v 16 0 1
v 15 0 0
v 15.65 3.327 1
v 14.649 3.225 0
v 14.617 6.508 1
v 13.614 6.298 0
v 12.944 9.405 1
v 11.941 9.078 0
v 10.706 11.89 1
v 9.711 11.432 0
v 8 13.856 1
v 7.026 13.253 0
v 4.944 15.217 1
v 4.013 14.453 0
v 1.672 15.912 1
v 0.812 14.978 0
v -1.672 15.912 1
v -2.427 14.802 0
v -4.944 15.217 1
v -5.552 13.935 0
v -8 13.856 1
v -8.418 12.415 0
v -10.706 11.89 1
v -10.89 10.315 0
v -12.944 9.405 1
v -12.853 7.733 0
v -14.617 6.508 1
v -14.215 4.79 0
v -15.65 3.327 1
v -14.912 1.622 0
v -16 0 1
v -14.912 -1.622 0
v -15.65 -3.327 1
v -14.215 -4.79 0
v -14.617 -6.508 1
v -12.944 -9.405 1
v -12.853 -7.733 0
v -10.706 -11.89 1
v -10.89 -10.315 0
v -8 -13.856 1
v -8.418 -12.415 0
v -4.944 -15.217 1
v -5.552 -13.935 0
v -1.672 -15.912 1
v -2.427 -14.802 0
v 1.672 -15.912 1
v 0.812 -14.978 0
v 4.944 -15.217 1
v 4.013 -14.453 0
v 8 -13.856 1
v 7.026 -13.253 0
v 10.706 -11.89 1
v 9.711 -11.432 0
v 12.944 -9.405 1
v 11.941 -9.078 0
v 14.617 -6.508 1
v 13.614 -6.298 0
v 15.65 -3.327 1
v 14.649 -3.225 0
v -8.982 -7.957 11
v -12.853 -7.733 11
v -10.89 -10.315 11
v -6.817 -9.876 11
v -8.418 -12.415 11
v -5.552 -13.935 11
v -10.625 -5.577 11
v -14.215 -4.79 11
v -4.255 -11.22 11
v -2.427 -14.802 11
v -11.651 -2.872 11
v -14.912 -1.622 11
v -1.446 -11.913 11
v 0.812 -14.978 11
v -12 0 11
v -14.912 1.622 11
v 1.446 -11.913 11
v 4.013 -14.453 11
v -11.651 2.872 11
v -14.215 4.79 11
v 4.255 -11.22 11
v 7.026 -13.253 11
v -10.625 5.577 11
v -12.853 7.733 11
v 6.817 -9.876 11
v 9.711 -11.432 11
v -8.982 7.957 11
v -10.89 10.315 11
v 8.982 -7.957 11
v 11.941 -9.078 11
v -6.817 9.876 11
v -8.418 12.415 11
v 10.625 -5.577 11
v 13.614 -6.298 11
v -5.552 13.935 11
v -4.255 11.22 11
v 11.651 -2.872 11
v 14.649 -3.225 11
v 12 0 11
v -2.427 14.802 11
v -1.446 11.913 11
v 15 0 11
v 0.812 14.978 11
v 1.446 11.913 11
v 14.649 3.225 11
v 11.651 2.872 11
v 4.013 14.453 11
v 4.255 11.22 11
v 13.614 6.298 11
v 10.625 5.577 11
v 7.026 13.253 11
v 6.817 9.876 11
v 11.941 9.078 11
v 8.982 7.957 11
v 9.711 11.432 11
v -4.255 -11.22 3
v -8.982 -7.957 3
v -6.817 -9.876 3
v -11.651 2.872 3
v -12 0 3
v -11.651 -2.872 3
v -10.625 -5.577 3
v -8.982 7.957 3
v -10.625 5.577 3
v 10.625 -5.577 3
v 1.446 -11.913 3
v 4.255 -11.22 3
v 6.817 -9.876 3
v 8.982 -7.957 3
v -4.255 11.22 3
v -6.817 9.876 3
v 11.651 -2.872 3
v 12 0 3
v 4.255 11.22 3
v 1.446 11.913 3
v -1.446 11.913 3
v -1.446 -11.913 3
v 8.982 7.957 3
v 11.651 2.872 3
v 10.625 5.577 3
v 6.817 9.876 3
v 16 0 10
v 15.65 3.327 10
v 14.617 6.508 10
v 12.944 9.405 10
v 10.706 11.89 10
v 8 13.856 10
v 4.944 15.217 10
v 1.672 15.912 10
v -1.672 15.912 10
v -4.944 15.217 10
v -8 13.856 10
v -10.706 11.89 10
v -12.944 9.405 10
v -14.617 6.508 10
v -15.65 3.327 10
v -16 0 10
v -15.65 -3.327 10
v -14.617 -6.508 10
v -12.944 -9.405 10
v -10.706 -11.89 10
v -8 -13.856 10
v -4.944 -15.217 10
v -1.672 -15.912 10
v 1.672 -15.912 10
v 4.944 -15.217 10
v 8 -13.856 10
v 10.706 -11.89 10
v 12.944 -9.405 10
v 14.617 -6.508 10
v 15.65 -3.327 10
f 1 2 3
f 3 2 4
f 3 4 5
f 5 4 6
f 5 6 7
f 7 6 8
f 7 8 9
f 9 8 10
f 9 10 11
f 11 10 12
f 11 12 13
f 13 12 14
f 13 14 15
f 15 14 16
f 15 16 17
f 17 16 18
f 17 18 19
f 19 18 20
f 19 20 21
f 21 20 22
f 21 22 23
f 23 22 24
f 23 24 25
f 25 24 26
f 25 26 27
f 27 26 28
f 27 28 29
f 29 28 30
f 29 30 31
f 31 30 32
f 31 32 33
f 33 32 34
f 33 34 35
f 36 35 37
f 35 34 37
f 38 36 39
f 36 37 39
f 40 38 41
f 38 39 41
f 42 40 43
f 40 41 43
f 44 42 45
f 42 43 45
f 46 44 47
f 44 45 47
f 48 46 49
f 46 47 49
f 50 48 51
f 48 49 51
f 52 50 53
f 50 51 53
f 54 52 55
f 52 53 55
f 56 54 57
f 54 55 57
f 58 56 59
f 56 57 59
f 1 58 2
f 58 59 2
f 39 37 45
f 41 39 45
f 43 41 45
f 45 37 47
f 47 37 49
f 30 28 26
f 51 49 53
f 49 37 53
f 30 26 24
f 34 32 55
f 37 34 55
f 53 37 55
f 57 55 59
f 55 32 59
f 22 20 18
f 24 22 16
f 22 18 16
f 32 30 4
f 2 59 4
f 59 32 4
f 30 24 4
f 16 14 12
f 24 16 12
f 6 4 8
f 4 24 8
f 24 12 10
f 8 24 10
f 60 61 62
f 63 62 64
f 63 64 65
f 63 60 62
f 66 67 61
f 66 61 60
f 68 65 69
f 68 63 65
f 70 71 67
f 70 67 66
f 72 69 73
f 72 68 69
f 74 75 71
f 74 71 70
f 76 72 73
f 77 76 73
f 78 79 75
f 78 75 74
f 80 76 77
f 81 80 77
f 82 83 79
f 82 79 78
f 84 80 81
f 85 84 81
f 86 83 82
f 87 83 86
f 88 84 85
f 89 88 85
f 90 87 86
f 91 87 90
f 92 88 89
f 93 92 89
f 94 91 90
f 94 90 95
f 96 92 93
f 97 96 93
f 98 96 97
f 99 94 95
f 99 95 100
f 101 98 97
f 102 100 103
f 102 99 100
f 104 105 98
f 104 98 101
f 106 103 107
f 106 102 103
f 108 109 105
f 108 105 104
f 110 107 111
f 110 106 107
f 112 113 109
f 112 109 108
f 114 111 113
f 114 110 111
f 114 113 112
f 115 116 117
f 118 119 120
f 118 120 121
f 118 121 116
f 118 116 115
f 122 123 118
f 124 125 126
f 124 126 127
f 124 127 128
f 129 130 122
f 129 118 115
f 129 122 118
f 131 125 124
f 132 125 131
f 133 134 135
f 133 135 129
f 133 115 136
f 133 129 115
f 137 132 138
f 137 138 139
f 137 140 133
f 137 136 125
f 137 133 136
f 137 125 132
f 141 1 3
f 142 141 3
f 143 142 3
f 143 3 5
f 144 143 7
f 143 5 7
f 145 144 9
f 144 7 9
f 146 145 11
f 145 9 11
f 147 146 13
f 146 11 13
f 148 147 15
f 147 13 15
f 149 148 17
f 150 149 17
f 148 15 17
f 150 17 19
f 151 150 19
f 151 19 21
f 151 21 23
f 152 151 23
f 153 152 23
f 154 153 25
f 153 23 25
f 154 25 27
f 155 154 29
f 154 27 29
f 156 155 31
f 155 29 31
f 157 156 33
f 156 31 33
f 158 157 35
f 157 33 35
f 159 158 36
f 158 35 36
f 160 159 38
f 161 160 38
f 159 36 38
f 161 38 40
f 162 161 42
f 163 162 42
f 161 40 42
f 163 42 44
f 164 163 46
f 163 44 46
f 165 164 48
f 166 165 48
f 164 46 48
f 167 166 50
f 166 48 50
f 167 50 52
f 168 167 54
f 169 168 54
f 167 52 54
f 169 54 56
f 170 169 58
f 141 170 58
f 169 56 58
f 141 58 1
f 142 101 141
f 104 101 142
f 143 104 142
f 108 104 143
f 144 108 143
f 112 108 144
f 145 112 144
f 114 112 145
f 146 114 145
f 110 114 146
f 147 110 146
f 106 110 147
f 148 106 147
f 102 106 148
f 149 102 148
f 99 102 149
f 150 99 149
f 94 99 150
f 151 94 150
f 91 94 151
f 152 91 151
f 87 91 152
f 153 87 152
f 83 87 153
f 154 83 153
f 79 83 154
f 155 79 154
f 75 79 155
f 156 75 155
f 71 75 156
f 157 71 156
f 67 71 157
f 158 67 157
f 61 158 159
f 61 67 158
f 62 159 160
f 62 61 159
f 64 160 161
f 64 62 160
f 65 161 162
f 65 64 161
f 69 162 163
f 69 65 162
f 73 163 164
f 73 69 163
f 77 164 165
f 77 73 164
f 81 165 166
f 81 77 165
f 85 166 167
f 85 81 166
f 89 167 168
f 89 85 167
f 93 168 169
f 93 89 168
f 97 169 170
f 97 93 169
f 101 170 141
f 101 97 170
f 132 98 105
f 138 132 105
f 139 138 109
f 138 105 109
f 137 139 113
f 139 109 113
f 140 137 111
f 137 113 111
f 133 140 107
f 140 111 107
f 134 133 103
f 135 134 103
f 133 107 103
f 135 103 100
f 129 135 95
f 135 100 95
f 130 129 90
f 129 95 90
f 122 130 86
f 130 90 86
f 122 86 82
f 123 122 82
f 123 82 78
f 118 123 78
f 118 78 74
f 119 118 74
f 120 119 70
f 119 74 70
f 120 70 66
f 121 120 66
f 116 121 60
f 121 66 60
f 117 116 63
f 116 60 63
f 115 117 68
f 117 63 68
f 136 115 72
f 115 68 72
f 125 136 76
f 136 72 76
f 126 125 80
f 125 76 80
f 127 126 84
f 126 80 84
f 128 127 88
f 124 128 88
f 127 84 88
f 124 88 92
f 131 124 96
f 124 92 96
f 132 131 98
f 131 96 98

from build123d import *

# Parameters (mm, degrees)
SKETCH_1_R          = 16
EXTRUDE_1_DEPTH     = 11
CHAMFER_1_SIZE      = 1
SKETCH_2_R          = 12
CUT_EXTRUDE_1_DEPTH = 8


with BuildPart() as part:
    # 草图1 → 拉伸1 (new body)
    with BuildSketch(Plane.XY):
        Circle(SKETCH_1_R)
    extrude(amount=EXTRUDE_1_DEPTH)

    # 倒角1
    chamfer_1_edges = [part.edges().sort_by_distance(p)[0] for p in [
        (-16, 0, 0),
        (-16, 0, 11),
    ]]
    chamfer(chamfer_1_edges, length=CHAMFER_1_SIZE)

    # 草图2 → 切除-拉伸1 (cut)
    with BuildSketch(Plane.XY.offset(11)):
        Circle(SKETCH_2_R)
    extrude(amount=-CUT_EXTRUDE_1_DEPTH, mode=Mode.SUBTRACT)


solid = part.part
